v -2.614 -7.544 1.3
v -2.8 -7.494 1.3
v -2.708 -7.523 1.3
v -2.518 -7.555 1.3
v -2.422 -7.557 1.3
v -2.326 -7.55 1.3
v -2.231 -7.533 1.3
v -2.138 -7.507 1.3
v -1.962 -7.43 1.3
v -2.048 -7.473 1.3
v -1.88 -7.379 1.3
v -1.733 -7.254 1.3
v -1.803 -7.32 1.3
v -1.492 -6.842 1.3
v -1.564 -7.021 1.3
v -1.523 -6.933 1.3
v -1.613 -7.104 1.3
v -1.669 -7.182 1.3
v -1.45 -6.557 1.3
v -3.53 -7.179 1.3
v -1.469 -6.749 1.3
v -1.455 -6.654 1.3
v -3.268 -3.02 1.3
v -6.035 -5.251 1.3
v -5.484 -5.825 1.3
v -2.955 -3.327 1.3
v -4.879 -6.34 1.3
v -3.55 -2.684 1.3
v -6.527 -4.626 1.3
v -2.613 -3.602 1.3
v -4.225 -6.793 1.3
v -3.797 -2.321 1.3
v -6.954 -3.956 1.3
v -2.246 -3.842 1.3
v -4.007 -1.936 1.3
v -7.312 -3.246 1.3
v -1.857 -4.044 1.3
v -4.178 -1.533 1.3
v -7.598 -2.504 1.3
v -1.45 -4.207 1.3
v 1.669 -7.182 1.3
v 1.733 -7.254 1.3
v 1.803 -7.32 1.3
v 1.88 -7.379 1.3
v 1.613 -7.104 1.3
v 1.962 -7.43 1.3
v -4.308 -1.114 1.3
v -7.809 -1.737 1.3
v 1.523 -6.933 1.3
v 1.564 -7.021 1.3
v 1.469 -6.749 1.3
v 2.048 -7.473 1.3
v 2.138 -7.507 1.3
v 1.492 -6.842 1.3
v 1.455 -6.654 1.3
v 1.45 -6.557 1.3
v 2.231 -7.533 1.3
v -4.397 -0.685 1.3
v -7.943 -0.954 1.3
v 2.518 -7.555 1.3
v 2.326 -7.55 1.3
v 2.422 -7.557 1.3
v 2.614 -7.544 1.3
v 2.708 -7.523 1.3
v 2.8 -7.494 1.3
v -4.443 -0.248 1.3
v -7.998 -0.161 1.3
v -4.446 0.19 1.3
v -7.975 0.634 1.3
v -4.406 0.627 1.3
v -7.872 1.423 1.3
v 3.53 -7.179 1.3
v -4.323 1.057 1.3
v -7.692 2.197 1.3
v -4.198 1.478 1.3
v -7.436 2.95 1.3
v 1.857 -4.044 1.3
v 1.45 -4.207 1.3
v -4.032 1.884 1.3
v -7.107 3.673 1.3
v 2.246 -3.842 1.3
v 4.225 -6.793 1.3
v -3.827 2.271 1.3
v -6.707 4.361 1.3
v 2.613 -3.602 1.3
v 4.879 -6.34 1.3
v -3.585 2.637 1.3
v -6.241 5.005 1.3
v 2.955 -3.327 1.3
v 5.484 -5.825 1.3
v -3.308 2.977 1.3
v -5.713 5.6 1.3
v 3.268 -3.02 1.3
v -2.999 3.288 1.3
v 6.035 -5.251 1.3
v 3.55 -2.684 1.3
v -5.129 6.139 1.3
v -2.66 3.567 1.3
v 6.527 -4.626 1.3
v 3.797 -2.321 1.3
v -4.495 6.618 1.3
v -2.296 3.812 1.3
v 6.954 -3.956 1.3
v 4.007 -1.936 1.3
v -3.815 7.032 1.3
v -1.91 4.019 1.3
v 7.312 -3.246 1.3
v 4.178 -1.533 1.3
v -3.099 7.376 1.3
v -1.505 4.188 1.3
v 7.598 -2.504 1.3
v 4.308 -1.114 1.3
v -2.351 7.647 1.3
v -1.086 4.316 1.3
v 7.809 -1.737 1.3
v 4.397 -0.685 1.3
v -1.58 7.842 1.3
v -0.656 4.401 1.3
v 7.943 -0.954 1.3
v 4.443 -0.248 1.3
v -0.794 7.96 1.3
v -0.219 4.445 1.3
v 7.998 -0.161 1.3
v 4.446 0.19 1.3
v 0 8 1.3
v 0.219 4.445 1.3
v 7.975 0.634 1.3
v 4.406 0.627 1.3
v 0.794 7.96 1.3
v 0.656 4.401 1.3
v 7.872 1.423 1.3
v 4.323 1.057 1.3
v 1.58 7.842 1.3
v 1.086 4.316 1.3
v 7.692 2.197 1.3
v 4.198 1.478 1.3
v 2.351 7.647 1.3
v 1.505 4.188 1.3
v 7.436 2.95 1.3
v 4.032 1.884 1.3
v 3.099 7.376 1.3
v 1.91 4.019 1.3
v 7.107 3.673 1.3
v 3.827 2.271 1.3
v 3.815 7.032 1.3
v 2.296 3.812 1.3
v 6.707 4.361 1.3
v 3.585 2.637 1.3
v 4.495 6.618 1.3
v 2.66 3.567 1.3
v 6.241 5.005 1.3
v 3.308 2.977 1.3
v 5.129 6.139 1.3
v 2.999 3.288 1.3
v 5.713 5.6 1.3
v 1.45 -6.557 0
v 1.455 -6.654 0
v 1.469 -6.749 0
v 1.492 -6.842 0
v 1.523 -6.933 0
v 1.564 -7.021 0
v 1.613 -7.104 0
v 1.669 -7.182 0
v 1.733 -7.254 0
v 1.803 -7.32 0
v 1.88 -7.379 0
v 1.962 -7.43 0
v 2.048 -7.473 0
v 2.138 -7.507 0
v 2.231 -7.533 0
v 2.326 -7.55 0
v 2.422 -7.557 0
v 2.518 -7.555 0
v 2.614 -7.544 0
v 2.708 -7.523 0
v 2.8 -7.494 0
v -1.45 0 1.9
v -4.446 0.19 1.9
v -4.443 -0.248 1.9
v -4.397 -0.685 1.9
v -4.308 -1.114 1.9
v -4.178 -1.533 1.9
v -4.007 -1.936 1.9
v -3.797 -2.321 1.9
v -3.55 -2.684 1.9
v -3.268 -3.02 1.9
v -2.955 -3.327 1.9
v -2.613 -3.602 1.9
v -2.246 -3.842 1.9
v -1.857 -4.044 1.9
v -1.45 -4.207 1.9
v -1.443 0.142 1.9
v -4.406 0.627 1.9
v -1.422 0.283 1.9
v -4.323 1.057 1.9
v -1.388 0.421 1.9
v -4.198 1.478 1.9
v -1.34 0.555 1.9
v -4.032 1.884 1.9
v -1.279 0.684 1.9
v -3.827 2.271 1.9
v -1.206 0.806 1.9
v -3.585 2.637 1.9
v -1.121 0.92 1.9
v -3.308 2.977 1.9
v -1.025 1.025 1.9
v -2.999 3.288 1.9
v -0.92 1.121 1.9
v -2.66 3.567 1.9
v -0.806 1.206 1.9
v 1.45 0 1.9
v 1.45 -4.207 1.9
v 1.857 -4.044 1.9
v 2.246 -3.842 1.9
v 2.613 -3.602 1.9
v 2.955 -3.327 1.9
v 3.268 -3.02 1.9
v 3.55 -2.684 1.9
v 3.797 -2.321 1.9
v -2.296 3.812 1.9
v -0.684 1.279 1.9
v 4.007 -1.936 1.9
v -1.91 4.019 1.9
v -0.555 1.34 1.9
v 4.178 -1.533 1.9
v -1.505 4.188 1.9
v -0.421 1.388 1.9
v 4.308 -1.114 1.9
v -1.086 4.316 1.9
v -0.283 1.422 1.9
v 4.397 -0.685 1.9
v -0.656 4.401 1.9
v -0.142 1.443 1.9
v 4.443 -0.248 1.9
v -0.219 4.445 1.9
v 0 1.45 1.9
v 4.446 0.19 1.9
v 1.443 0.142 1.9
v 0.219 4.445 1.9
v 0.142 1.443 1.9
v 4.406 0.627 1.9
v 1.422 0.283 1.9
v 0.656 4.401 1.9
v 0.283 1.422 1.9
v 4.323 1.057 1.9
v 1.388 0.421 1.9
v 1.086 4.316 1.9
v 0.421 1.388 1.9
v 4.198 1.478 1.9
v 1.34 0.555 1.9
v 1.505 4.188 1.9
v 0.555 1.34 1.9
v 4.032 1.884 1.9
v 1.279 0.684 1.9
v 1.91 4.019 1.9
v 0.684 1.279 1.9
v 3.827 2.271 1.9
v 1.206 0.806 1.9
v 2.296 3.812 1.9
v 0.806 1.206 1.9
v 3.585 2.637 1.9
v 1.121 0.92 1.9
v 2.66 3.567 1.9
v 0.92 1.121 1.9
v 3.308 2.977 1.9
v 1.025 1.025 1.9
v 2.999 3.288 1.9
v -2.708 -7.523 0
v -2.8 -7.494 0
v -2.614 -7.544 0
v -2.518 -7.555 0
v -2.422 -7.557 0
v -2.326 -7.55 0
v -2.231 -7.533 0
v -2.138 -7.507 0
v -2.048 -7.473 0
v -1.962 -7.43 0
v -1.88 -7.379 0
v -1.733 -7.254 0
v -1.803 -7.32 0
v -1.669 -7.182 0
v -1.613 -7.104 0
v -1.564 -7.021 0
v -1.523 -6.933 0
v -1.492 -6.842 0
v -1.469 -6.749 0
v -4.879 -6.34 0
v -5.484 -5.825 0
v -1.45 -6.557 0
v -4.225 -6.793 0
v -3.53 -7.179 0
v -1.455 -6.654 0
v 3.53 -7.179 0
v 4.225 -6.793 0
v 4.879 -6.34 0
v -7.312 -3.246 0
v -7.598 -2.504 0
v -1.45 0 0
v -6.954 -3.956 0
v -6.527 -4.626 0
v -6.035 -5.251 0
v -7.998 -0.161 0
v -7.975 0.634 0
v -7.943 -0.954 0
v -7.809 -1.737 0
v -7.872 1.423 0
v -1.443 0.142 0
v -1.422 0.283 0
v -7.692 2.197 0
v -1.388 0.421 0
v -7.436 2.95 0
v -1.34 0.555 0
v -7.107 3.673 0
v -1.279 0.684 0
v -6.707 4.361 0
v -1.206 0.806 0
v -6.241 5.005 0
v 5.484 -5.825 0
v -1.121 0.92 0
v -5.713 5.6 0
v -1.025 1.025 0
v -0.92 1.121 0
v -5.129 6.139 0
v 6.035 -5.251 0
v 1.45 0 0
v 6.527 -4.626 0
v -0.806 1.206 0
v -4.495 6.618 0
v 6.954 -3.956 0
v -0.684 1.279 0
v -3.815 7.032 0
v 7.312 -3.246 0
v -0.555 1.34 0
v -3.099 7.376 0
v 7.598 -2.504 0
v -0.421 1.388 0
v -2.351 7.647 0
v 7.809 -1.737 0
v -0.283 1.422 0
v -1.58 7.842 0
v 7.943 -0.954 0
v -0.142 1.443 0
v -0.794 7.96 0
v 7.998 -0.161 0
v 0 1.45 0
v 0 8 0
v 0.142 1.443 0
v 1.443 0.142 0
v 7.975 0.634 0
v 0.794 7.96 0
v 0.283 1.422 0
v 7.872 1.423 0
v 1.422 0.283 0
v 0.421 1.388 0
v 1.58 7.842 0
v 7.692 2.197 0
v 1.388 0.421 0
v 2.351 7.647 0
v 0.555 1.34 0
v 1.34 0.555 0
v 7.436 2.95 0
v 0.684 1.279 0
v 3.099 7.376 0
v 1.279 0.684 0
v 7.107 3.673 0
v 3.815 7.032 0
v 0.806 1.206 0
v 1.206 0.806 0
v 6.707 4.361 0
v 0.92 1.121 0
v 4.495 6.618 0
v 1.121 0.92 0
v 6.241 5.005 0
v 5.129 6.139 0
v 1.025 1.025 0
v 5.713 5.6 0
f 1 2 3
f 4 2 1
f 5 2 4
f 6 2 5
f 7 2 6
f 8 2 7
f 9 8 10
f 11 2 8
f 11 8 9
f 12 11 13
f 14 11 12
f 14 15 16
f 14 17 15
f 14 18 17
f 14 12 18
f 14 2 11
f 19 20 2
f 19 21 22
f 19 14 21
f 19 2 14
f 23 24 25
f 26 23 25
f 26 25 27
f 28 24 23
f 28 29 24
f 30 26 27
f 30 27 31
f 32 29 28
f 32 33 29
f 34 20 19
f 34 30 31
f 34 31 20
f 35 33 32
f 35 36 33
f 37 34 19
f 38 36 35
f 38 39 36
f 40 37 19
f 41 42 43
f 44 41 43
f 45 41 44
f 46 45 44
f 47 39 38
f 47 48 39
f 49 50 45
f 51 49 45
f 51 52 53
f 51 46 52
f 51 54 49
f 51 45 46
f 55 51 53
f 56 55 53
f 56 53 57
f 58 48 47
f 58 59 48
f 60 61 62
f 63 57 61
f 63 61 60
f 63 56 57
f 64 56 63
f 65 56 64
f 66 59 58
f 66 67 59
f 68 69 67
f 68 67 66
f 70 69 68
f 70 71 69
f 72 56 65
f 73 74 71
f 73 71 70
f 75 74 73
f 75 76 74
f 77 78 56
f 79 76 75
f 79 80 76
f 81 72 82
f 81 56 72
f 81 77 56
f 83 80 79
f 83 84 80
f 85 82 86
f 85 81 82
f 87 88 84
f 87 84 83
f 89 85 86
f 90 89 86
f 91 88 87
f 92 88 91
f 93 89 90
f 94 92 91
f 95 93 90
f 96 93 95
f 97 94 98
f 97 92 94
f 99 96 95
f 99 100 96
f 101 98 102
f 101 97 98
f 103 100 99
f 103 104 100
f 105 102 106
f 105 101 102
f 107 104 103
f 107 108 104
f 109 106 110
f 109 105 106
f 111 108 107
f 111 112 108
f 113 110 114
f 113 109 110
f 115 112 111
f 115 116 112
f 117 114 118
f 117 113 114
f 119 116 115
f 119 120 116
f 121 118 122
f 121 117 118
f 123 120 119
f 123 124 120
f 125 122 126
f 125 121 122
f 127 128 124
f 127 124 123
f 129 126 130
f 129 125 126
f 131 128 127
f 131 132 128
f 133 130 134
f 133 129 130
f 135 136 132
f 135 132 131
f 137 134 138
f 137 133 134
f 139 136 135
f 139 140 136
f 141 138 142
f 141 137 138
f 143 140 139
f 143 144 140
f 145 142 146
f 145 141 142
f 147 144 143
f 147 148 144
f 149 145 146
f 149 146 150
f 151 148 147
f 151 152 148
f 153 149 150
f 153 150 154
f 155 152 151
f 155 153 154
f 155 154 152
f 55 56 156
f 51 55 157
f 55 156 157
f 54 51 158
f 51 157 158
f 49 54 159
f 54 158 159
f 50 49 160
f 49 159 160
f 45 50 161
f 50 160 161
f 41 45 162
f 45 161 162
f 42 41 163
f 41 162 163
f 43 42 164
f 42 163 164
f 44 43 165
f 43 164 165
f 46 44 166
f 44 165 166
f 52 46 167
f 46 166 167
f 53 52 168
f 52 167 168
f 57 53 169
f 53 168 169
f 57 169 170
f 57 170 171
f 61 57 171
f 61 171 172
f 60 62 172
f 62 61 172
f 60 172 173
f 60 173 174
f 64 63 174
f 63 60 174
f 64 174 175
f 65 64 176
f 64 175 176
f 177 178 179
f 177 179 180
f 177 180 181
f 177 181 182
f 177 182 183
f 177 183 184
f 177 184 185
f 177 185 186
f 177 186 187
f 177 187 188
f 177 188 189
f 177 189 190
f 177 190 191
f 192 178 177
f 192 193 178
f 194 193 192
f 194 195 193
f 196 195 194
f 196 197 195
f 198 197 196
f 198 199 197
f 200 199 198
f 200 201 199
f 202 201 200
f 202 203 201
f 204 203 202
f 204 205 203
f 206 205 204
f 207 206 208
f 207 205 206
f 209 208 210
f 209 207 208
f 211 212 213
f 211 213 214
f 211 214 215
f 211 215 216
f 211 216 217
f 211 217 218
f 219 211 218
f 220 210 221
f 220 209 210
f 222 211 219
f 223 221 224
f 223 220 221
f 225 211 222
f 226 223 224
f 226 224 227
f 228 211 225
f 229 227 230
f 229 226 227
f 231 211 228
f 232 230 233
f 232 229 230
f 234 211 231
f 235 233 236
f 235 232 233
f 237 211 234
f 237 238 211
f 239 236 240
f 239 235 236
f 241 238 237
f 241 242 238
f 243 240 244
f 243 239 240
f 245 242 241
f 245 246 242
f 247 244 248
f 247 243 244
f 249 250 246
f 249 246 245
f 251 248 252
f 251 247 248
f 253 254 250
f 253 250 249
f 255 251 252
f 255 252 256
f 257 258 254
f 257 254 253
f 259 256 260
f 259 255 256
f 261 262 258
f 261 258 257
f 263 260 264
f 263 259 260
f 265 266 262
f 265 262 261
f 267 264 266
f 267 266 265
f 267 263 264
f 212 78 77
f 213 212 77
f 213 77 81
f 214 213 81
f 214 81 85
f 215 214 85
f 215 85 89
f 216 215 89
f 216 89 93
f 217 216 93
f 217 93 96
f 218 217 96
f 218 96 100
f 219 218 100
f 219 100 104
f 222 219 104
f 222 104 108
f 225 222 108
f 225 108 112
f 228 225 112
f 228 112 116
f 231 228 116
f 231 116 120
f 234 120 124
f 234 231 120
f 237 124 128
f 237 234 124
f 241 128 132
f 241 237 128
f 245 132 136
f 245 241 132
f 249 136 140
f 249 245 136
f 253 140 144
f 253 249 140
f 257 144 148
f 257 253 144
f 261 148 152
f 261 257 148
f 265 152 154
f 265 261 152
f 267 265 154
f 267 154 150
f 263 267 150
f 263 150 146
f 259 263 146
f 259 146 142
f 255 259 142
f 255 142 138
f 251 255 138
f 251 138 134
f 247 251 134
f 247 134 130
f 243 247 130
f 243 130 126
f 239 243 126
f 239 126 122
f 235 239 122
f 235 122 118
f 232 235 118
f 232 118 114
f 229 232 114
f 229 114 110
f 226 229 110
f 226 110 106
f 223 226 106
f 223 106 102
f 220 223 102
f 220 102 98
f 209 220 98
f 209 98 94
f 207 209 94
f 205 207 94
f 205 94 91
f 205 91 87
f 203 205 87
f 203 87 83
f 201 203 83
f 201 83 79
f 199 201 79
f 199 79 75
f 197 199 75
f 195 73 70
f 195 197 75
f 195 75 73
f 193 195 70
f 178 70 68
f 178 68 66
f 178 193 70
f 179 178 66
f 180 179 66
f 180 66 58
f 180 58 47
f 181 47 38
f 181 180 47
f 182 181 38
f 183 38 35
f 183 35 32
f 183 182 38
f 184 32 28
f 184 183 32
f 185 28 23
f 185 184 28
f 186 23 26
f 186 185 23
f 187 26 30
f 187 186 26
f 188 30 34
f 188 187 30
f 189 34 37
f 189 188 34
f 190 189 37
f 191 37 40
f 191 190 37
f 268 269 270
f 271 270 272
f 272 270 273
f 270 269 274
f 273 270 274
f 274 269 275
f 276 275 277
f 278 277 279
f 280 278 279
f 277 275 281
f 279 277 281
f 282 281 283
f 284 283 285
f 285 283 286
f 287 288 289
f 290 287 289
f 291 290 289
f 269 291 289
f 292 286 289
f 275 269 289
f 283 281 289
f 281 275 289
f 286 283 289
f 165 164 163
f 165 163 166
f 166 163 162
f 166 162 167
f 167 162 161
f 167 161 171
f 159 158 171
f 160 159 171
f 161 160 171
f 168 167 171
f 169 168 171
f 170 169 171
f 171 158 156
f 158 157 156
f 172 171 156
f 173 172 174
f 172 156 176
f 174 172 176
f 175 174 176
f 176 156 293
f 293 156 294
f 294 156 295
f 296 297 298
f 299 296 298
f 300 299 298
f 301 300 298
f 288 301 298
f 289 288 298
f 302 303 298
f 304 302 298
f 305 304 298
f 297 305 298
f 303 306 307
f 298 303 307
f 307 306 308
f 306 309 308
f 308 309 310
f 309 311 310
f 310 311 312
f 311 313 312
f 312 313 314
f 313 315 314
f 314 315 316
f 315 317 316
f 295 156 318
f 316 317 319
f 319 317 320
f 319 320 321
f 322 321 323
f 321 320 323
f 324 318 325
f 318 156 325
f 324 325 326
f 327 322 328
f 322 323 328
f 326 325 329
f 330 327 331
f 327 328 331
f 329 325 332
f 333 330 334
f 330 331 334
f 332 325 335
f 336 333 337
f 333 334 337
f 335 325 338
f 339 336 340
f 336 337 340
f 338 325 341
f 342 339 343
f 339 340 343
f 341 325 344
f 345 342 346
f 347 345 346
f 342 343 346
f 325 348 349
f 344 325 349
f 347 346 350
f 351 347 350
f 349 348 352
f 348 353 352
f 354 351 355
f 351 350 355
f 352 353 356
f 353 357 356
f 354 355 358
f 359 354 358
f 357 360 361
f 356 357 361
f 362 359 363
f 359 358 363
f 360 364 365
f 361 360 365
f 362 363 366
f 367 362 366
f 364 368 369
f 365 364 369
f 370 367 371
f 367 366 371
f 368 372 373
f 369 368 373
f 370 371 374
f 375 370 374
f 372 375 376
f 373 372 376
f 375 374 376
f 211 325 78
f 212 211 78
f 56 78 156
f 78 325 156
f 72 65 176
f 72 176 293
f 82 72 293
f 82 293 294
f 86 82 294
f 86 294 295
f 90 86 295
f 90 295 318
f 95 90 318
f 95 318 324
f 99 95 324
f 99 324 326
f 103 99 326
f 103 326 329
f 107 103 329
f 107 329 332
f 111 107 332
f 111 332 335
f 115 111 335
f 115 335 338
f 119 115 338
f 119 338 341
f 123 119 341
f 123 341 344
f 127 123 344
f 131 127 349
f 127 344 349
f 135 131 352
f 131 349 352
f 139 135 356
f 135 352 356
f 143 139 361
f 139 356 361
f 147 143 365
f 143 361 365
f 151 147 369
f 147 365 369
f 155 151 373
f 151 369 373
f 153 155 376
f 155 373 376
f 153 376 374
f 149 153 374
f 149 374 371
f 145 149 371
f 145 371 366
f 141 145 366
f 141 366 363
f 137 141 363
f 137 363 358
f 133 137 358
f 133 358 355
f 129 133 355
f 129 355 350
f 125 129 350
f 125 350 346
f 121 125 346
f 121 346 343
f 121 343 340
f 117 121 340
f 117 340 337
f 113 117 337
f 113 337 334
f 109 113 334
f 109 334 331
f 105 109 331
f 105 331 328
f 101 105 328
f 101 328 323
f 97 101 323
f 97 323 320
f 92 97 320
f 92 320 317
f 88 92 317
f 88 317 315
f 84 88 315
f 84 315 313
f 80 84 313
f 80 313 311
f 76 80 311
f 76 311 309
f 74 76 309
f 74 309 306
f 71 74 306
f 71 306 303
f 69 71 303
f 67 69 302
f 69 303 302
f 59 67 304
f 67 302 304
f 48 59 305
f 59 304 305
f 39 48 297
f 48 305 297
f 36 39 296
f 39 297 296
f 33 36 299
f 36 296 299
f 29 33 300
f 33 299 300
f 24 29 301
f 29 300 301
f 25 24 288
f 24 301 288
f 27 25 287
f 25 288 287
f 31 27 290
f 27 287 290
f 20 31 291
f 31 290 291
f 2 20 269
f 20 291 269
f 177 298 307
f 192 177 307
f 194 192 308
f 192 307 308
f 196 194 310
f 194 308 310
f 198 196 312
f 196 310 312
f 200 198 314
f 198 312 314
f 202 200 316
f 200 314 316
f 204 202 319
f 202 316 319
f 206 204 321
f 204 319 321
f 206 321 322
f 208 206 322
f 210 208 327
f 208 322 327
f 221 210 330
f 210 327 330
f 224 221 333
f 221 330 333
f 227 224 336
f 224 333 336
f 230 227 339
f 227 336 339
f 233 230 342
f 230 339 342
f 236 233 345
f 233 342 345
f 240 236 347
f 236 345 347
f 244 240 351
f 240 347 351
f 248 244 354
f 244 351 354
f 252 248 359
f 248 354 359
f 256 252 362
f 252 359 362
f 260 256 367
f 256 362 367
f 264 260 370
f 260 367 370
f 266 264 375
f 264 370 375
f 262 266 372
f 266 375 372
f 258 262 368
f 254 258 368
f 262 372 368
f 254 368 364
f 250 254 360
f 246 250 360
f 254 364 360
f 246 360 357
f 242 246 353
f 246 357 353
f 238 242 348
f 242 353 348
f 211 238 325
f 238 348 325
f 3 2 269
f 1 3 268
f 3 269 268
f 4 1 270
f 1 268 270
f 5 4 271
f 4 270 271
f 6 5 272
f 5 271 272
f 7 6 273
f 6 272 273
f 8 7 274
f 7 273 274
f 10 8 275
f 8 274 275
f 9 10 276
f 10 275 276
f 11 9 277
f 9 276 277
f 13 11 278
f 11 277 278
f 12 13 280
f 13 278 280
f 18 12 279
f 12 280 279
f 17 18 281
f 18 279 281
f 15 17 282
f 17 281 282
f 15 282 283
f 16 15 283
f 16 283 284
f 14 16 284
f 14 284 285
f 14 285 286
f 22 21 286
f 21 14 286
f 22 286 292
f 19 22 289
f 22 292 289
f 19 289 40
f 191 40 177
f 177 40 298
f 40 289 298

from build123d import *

# Parameters (mm, degrees)
F1_DEPTH = 1.9
F2_R     = 8
F2_R_2   = 4.45
F3_DEPTH = 0.6


with BuildPart() as f1:
    # F0 (on Top) → F1 (new body)
    with BuildSketch(Plane.XY):
        with BuildLine():
            ThreePointArc((-1.45, 0), (0, 1.45), (1.45, 0))
            Line((1.45, 0), (1.45, -6.5572478983))
            ThreePointArc((1.45, -6.5572478983), (1.8799122875, -7.3788317346), (2.8, -7.4939975981))
            ThreePointArc((2.8, -7.4939975981), (0, 8), (-2.8, -7.4939975981))
            ThreePointArc((-2.8, -7.4939975981), (-1.8799122875, -7.3788317346), (-1.45, -6.5572478983))
            Line((-1.45, -6.5572478983), (-1.45, 0))
        make_face()
    extrude(amount=F1_DEPTH)

    # F2 (on face) → F3 (cut)
    with BuildSketch(Plane.XY.offset(1.9)):
        Circle(F2_R)
        Circle(F2_R_2, mode=Mode.SUBTRACT)
    extrude(amount=-F3_DEPTH, mode=Mode.SUBTRACT)


solid = f1.part
